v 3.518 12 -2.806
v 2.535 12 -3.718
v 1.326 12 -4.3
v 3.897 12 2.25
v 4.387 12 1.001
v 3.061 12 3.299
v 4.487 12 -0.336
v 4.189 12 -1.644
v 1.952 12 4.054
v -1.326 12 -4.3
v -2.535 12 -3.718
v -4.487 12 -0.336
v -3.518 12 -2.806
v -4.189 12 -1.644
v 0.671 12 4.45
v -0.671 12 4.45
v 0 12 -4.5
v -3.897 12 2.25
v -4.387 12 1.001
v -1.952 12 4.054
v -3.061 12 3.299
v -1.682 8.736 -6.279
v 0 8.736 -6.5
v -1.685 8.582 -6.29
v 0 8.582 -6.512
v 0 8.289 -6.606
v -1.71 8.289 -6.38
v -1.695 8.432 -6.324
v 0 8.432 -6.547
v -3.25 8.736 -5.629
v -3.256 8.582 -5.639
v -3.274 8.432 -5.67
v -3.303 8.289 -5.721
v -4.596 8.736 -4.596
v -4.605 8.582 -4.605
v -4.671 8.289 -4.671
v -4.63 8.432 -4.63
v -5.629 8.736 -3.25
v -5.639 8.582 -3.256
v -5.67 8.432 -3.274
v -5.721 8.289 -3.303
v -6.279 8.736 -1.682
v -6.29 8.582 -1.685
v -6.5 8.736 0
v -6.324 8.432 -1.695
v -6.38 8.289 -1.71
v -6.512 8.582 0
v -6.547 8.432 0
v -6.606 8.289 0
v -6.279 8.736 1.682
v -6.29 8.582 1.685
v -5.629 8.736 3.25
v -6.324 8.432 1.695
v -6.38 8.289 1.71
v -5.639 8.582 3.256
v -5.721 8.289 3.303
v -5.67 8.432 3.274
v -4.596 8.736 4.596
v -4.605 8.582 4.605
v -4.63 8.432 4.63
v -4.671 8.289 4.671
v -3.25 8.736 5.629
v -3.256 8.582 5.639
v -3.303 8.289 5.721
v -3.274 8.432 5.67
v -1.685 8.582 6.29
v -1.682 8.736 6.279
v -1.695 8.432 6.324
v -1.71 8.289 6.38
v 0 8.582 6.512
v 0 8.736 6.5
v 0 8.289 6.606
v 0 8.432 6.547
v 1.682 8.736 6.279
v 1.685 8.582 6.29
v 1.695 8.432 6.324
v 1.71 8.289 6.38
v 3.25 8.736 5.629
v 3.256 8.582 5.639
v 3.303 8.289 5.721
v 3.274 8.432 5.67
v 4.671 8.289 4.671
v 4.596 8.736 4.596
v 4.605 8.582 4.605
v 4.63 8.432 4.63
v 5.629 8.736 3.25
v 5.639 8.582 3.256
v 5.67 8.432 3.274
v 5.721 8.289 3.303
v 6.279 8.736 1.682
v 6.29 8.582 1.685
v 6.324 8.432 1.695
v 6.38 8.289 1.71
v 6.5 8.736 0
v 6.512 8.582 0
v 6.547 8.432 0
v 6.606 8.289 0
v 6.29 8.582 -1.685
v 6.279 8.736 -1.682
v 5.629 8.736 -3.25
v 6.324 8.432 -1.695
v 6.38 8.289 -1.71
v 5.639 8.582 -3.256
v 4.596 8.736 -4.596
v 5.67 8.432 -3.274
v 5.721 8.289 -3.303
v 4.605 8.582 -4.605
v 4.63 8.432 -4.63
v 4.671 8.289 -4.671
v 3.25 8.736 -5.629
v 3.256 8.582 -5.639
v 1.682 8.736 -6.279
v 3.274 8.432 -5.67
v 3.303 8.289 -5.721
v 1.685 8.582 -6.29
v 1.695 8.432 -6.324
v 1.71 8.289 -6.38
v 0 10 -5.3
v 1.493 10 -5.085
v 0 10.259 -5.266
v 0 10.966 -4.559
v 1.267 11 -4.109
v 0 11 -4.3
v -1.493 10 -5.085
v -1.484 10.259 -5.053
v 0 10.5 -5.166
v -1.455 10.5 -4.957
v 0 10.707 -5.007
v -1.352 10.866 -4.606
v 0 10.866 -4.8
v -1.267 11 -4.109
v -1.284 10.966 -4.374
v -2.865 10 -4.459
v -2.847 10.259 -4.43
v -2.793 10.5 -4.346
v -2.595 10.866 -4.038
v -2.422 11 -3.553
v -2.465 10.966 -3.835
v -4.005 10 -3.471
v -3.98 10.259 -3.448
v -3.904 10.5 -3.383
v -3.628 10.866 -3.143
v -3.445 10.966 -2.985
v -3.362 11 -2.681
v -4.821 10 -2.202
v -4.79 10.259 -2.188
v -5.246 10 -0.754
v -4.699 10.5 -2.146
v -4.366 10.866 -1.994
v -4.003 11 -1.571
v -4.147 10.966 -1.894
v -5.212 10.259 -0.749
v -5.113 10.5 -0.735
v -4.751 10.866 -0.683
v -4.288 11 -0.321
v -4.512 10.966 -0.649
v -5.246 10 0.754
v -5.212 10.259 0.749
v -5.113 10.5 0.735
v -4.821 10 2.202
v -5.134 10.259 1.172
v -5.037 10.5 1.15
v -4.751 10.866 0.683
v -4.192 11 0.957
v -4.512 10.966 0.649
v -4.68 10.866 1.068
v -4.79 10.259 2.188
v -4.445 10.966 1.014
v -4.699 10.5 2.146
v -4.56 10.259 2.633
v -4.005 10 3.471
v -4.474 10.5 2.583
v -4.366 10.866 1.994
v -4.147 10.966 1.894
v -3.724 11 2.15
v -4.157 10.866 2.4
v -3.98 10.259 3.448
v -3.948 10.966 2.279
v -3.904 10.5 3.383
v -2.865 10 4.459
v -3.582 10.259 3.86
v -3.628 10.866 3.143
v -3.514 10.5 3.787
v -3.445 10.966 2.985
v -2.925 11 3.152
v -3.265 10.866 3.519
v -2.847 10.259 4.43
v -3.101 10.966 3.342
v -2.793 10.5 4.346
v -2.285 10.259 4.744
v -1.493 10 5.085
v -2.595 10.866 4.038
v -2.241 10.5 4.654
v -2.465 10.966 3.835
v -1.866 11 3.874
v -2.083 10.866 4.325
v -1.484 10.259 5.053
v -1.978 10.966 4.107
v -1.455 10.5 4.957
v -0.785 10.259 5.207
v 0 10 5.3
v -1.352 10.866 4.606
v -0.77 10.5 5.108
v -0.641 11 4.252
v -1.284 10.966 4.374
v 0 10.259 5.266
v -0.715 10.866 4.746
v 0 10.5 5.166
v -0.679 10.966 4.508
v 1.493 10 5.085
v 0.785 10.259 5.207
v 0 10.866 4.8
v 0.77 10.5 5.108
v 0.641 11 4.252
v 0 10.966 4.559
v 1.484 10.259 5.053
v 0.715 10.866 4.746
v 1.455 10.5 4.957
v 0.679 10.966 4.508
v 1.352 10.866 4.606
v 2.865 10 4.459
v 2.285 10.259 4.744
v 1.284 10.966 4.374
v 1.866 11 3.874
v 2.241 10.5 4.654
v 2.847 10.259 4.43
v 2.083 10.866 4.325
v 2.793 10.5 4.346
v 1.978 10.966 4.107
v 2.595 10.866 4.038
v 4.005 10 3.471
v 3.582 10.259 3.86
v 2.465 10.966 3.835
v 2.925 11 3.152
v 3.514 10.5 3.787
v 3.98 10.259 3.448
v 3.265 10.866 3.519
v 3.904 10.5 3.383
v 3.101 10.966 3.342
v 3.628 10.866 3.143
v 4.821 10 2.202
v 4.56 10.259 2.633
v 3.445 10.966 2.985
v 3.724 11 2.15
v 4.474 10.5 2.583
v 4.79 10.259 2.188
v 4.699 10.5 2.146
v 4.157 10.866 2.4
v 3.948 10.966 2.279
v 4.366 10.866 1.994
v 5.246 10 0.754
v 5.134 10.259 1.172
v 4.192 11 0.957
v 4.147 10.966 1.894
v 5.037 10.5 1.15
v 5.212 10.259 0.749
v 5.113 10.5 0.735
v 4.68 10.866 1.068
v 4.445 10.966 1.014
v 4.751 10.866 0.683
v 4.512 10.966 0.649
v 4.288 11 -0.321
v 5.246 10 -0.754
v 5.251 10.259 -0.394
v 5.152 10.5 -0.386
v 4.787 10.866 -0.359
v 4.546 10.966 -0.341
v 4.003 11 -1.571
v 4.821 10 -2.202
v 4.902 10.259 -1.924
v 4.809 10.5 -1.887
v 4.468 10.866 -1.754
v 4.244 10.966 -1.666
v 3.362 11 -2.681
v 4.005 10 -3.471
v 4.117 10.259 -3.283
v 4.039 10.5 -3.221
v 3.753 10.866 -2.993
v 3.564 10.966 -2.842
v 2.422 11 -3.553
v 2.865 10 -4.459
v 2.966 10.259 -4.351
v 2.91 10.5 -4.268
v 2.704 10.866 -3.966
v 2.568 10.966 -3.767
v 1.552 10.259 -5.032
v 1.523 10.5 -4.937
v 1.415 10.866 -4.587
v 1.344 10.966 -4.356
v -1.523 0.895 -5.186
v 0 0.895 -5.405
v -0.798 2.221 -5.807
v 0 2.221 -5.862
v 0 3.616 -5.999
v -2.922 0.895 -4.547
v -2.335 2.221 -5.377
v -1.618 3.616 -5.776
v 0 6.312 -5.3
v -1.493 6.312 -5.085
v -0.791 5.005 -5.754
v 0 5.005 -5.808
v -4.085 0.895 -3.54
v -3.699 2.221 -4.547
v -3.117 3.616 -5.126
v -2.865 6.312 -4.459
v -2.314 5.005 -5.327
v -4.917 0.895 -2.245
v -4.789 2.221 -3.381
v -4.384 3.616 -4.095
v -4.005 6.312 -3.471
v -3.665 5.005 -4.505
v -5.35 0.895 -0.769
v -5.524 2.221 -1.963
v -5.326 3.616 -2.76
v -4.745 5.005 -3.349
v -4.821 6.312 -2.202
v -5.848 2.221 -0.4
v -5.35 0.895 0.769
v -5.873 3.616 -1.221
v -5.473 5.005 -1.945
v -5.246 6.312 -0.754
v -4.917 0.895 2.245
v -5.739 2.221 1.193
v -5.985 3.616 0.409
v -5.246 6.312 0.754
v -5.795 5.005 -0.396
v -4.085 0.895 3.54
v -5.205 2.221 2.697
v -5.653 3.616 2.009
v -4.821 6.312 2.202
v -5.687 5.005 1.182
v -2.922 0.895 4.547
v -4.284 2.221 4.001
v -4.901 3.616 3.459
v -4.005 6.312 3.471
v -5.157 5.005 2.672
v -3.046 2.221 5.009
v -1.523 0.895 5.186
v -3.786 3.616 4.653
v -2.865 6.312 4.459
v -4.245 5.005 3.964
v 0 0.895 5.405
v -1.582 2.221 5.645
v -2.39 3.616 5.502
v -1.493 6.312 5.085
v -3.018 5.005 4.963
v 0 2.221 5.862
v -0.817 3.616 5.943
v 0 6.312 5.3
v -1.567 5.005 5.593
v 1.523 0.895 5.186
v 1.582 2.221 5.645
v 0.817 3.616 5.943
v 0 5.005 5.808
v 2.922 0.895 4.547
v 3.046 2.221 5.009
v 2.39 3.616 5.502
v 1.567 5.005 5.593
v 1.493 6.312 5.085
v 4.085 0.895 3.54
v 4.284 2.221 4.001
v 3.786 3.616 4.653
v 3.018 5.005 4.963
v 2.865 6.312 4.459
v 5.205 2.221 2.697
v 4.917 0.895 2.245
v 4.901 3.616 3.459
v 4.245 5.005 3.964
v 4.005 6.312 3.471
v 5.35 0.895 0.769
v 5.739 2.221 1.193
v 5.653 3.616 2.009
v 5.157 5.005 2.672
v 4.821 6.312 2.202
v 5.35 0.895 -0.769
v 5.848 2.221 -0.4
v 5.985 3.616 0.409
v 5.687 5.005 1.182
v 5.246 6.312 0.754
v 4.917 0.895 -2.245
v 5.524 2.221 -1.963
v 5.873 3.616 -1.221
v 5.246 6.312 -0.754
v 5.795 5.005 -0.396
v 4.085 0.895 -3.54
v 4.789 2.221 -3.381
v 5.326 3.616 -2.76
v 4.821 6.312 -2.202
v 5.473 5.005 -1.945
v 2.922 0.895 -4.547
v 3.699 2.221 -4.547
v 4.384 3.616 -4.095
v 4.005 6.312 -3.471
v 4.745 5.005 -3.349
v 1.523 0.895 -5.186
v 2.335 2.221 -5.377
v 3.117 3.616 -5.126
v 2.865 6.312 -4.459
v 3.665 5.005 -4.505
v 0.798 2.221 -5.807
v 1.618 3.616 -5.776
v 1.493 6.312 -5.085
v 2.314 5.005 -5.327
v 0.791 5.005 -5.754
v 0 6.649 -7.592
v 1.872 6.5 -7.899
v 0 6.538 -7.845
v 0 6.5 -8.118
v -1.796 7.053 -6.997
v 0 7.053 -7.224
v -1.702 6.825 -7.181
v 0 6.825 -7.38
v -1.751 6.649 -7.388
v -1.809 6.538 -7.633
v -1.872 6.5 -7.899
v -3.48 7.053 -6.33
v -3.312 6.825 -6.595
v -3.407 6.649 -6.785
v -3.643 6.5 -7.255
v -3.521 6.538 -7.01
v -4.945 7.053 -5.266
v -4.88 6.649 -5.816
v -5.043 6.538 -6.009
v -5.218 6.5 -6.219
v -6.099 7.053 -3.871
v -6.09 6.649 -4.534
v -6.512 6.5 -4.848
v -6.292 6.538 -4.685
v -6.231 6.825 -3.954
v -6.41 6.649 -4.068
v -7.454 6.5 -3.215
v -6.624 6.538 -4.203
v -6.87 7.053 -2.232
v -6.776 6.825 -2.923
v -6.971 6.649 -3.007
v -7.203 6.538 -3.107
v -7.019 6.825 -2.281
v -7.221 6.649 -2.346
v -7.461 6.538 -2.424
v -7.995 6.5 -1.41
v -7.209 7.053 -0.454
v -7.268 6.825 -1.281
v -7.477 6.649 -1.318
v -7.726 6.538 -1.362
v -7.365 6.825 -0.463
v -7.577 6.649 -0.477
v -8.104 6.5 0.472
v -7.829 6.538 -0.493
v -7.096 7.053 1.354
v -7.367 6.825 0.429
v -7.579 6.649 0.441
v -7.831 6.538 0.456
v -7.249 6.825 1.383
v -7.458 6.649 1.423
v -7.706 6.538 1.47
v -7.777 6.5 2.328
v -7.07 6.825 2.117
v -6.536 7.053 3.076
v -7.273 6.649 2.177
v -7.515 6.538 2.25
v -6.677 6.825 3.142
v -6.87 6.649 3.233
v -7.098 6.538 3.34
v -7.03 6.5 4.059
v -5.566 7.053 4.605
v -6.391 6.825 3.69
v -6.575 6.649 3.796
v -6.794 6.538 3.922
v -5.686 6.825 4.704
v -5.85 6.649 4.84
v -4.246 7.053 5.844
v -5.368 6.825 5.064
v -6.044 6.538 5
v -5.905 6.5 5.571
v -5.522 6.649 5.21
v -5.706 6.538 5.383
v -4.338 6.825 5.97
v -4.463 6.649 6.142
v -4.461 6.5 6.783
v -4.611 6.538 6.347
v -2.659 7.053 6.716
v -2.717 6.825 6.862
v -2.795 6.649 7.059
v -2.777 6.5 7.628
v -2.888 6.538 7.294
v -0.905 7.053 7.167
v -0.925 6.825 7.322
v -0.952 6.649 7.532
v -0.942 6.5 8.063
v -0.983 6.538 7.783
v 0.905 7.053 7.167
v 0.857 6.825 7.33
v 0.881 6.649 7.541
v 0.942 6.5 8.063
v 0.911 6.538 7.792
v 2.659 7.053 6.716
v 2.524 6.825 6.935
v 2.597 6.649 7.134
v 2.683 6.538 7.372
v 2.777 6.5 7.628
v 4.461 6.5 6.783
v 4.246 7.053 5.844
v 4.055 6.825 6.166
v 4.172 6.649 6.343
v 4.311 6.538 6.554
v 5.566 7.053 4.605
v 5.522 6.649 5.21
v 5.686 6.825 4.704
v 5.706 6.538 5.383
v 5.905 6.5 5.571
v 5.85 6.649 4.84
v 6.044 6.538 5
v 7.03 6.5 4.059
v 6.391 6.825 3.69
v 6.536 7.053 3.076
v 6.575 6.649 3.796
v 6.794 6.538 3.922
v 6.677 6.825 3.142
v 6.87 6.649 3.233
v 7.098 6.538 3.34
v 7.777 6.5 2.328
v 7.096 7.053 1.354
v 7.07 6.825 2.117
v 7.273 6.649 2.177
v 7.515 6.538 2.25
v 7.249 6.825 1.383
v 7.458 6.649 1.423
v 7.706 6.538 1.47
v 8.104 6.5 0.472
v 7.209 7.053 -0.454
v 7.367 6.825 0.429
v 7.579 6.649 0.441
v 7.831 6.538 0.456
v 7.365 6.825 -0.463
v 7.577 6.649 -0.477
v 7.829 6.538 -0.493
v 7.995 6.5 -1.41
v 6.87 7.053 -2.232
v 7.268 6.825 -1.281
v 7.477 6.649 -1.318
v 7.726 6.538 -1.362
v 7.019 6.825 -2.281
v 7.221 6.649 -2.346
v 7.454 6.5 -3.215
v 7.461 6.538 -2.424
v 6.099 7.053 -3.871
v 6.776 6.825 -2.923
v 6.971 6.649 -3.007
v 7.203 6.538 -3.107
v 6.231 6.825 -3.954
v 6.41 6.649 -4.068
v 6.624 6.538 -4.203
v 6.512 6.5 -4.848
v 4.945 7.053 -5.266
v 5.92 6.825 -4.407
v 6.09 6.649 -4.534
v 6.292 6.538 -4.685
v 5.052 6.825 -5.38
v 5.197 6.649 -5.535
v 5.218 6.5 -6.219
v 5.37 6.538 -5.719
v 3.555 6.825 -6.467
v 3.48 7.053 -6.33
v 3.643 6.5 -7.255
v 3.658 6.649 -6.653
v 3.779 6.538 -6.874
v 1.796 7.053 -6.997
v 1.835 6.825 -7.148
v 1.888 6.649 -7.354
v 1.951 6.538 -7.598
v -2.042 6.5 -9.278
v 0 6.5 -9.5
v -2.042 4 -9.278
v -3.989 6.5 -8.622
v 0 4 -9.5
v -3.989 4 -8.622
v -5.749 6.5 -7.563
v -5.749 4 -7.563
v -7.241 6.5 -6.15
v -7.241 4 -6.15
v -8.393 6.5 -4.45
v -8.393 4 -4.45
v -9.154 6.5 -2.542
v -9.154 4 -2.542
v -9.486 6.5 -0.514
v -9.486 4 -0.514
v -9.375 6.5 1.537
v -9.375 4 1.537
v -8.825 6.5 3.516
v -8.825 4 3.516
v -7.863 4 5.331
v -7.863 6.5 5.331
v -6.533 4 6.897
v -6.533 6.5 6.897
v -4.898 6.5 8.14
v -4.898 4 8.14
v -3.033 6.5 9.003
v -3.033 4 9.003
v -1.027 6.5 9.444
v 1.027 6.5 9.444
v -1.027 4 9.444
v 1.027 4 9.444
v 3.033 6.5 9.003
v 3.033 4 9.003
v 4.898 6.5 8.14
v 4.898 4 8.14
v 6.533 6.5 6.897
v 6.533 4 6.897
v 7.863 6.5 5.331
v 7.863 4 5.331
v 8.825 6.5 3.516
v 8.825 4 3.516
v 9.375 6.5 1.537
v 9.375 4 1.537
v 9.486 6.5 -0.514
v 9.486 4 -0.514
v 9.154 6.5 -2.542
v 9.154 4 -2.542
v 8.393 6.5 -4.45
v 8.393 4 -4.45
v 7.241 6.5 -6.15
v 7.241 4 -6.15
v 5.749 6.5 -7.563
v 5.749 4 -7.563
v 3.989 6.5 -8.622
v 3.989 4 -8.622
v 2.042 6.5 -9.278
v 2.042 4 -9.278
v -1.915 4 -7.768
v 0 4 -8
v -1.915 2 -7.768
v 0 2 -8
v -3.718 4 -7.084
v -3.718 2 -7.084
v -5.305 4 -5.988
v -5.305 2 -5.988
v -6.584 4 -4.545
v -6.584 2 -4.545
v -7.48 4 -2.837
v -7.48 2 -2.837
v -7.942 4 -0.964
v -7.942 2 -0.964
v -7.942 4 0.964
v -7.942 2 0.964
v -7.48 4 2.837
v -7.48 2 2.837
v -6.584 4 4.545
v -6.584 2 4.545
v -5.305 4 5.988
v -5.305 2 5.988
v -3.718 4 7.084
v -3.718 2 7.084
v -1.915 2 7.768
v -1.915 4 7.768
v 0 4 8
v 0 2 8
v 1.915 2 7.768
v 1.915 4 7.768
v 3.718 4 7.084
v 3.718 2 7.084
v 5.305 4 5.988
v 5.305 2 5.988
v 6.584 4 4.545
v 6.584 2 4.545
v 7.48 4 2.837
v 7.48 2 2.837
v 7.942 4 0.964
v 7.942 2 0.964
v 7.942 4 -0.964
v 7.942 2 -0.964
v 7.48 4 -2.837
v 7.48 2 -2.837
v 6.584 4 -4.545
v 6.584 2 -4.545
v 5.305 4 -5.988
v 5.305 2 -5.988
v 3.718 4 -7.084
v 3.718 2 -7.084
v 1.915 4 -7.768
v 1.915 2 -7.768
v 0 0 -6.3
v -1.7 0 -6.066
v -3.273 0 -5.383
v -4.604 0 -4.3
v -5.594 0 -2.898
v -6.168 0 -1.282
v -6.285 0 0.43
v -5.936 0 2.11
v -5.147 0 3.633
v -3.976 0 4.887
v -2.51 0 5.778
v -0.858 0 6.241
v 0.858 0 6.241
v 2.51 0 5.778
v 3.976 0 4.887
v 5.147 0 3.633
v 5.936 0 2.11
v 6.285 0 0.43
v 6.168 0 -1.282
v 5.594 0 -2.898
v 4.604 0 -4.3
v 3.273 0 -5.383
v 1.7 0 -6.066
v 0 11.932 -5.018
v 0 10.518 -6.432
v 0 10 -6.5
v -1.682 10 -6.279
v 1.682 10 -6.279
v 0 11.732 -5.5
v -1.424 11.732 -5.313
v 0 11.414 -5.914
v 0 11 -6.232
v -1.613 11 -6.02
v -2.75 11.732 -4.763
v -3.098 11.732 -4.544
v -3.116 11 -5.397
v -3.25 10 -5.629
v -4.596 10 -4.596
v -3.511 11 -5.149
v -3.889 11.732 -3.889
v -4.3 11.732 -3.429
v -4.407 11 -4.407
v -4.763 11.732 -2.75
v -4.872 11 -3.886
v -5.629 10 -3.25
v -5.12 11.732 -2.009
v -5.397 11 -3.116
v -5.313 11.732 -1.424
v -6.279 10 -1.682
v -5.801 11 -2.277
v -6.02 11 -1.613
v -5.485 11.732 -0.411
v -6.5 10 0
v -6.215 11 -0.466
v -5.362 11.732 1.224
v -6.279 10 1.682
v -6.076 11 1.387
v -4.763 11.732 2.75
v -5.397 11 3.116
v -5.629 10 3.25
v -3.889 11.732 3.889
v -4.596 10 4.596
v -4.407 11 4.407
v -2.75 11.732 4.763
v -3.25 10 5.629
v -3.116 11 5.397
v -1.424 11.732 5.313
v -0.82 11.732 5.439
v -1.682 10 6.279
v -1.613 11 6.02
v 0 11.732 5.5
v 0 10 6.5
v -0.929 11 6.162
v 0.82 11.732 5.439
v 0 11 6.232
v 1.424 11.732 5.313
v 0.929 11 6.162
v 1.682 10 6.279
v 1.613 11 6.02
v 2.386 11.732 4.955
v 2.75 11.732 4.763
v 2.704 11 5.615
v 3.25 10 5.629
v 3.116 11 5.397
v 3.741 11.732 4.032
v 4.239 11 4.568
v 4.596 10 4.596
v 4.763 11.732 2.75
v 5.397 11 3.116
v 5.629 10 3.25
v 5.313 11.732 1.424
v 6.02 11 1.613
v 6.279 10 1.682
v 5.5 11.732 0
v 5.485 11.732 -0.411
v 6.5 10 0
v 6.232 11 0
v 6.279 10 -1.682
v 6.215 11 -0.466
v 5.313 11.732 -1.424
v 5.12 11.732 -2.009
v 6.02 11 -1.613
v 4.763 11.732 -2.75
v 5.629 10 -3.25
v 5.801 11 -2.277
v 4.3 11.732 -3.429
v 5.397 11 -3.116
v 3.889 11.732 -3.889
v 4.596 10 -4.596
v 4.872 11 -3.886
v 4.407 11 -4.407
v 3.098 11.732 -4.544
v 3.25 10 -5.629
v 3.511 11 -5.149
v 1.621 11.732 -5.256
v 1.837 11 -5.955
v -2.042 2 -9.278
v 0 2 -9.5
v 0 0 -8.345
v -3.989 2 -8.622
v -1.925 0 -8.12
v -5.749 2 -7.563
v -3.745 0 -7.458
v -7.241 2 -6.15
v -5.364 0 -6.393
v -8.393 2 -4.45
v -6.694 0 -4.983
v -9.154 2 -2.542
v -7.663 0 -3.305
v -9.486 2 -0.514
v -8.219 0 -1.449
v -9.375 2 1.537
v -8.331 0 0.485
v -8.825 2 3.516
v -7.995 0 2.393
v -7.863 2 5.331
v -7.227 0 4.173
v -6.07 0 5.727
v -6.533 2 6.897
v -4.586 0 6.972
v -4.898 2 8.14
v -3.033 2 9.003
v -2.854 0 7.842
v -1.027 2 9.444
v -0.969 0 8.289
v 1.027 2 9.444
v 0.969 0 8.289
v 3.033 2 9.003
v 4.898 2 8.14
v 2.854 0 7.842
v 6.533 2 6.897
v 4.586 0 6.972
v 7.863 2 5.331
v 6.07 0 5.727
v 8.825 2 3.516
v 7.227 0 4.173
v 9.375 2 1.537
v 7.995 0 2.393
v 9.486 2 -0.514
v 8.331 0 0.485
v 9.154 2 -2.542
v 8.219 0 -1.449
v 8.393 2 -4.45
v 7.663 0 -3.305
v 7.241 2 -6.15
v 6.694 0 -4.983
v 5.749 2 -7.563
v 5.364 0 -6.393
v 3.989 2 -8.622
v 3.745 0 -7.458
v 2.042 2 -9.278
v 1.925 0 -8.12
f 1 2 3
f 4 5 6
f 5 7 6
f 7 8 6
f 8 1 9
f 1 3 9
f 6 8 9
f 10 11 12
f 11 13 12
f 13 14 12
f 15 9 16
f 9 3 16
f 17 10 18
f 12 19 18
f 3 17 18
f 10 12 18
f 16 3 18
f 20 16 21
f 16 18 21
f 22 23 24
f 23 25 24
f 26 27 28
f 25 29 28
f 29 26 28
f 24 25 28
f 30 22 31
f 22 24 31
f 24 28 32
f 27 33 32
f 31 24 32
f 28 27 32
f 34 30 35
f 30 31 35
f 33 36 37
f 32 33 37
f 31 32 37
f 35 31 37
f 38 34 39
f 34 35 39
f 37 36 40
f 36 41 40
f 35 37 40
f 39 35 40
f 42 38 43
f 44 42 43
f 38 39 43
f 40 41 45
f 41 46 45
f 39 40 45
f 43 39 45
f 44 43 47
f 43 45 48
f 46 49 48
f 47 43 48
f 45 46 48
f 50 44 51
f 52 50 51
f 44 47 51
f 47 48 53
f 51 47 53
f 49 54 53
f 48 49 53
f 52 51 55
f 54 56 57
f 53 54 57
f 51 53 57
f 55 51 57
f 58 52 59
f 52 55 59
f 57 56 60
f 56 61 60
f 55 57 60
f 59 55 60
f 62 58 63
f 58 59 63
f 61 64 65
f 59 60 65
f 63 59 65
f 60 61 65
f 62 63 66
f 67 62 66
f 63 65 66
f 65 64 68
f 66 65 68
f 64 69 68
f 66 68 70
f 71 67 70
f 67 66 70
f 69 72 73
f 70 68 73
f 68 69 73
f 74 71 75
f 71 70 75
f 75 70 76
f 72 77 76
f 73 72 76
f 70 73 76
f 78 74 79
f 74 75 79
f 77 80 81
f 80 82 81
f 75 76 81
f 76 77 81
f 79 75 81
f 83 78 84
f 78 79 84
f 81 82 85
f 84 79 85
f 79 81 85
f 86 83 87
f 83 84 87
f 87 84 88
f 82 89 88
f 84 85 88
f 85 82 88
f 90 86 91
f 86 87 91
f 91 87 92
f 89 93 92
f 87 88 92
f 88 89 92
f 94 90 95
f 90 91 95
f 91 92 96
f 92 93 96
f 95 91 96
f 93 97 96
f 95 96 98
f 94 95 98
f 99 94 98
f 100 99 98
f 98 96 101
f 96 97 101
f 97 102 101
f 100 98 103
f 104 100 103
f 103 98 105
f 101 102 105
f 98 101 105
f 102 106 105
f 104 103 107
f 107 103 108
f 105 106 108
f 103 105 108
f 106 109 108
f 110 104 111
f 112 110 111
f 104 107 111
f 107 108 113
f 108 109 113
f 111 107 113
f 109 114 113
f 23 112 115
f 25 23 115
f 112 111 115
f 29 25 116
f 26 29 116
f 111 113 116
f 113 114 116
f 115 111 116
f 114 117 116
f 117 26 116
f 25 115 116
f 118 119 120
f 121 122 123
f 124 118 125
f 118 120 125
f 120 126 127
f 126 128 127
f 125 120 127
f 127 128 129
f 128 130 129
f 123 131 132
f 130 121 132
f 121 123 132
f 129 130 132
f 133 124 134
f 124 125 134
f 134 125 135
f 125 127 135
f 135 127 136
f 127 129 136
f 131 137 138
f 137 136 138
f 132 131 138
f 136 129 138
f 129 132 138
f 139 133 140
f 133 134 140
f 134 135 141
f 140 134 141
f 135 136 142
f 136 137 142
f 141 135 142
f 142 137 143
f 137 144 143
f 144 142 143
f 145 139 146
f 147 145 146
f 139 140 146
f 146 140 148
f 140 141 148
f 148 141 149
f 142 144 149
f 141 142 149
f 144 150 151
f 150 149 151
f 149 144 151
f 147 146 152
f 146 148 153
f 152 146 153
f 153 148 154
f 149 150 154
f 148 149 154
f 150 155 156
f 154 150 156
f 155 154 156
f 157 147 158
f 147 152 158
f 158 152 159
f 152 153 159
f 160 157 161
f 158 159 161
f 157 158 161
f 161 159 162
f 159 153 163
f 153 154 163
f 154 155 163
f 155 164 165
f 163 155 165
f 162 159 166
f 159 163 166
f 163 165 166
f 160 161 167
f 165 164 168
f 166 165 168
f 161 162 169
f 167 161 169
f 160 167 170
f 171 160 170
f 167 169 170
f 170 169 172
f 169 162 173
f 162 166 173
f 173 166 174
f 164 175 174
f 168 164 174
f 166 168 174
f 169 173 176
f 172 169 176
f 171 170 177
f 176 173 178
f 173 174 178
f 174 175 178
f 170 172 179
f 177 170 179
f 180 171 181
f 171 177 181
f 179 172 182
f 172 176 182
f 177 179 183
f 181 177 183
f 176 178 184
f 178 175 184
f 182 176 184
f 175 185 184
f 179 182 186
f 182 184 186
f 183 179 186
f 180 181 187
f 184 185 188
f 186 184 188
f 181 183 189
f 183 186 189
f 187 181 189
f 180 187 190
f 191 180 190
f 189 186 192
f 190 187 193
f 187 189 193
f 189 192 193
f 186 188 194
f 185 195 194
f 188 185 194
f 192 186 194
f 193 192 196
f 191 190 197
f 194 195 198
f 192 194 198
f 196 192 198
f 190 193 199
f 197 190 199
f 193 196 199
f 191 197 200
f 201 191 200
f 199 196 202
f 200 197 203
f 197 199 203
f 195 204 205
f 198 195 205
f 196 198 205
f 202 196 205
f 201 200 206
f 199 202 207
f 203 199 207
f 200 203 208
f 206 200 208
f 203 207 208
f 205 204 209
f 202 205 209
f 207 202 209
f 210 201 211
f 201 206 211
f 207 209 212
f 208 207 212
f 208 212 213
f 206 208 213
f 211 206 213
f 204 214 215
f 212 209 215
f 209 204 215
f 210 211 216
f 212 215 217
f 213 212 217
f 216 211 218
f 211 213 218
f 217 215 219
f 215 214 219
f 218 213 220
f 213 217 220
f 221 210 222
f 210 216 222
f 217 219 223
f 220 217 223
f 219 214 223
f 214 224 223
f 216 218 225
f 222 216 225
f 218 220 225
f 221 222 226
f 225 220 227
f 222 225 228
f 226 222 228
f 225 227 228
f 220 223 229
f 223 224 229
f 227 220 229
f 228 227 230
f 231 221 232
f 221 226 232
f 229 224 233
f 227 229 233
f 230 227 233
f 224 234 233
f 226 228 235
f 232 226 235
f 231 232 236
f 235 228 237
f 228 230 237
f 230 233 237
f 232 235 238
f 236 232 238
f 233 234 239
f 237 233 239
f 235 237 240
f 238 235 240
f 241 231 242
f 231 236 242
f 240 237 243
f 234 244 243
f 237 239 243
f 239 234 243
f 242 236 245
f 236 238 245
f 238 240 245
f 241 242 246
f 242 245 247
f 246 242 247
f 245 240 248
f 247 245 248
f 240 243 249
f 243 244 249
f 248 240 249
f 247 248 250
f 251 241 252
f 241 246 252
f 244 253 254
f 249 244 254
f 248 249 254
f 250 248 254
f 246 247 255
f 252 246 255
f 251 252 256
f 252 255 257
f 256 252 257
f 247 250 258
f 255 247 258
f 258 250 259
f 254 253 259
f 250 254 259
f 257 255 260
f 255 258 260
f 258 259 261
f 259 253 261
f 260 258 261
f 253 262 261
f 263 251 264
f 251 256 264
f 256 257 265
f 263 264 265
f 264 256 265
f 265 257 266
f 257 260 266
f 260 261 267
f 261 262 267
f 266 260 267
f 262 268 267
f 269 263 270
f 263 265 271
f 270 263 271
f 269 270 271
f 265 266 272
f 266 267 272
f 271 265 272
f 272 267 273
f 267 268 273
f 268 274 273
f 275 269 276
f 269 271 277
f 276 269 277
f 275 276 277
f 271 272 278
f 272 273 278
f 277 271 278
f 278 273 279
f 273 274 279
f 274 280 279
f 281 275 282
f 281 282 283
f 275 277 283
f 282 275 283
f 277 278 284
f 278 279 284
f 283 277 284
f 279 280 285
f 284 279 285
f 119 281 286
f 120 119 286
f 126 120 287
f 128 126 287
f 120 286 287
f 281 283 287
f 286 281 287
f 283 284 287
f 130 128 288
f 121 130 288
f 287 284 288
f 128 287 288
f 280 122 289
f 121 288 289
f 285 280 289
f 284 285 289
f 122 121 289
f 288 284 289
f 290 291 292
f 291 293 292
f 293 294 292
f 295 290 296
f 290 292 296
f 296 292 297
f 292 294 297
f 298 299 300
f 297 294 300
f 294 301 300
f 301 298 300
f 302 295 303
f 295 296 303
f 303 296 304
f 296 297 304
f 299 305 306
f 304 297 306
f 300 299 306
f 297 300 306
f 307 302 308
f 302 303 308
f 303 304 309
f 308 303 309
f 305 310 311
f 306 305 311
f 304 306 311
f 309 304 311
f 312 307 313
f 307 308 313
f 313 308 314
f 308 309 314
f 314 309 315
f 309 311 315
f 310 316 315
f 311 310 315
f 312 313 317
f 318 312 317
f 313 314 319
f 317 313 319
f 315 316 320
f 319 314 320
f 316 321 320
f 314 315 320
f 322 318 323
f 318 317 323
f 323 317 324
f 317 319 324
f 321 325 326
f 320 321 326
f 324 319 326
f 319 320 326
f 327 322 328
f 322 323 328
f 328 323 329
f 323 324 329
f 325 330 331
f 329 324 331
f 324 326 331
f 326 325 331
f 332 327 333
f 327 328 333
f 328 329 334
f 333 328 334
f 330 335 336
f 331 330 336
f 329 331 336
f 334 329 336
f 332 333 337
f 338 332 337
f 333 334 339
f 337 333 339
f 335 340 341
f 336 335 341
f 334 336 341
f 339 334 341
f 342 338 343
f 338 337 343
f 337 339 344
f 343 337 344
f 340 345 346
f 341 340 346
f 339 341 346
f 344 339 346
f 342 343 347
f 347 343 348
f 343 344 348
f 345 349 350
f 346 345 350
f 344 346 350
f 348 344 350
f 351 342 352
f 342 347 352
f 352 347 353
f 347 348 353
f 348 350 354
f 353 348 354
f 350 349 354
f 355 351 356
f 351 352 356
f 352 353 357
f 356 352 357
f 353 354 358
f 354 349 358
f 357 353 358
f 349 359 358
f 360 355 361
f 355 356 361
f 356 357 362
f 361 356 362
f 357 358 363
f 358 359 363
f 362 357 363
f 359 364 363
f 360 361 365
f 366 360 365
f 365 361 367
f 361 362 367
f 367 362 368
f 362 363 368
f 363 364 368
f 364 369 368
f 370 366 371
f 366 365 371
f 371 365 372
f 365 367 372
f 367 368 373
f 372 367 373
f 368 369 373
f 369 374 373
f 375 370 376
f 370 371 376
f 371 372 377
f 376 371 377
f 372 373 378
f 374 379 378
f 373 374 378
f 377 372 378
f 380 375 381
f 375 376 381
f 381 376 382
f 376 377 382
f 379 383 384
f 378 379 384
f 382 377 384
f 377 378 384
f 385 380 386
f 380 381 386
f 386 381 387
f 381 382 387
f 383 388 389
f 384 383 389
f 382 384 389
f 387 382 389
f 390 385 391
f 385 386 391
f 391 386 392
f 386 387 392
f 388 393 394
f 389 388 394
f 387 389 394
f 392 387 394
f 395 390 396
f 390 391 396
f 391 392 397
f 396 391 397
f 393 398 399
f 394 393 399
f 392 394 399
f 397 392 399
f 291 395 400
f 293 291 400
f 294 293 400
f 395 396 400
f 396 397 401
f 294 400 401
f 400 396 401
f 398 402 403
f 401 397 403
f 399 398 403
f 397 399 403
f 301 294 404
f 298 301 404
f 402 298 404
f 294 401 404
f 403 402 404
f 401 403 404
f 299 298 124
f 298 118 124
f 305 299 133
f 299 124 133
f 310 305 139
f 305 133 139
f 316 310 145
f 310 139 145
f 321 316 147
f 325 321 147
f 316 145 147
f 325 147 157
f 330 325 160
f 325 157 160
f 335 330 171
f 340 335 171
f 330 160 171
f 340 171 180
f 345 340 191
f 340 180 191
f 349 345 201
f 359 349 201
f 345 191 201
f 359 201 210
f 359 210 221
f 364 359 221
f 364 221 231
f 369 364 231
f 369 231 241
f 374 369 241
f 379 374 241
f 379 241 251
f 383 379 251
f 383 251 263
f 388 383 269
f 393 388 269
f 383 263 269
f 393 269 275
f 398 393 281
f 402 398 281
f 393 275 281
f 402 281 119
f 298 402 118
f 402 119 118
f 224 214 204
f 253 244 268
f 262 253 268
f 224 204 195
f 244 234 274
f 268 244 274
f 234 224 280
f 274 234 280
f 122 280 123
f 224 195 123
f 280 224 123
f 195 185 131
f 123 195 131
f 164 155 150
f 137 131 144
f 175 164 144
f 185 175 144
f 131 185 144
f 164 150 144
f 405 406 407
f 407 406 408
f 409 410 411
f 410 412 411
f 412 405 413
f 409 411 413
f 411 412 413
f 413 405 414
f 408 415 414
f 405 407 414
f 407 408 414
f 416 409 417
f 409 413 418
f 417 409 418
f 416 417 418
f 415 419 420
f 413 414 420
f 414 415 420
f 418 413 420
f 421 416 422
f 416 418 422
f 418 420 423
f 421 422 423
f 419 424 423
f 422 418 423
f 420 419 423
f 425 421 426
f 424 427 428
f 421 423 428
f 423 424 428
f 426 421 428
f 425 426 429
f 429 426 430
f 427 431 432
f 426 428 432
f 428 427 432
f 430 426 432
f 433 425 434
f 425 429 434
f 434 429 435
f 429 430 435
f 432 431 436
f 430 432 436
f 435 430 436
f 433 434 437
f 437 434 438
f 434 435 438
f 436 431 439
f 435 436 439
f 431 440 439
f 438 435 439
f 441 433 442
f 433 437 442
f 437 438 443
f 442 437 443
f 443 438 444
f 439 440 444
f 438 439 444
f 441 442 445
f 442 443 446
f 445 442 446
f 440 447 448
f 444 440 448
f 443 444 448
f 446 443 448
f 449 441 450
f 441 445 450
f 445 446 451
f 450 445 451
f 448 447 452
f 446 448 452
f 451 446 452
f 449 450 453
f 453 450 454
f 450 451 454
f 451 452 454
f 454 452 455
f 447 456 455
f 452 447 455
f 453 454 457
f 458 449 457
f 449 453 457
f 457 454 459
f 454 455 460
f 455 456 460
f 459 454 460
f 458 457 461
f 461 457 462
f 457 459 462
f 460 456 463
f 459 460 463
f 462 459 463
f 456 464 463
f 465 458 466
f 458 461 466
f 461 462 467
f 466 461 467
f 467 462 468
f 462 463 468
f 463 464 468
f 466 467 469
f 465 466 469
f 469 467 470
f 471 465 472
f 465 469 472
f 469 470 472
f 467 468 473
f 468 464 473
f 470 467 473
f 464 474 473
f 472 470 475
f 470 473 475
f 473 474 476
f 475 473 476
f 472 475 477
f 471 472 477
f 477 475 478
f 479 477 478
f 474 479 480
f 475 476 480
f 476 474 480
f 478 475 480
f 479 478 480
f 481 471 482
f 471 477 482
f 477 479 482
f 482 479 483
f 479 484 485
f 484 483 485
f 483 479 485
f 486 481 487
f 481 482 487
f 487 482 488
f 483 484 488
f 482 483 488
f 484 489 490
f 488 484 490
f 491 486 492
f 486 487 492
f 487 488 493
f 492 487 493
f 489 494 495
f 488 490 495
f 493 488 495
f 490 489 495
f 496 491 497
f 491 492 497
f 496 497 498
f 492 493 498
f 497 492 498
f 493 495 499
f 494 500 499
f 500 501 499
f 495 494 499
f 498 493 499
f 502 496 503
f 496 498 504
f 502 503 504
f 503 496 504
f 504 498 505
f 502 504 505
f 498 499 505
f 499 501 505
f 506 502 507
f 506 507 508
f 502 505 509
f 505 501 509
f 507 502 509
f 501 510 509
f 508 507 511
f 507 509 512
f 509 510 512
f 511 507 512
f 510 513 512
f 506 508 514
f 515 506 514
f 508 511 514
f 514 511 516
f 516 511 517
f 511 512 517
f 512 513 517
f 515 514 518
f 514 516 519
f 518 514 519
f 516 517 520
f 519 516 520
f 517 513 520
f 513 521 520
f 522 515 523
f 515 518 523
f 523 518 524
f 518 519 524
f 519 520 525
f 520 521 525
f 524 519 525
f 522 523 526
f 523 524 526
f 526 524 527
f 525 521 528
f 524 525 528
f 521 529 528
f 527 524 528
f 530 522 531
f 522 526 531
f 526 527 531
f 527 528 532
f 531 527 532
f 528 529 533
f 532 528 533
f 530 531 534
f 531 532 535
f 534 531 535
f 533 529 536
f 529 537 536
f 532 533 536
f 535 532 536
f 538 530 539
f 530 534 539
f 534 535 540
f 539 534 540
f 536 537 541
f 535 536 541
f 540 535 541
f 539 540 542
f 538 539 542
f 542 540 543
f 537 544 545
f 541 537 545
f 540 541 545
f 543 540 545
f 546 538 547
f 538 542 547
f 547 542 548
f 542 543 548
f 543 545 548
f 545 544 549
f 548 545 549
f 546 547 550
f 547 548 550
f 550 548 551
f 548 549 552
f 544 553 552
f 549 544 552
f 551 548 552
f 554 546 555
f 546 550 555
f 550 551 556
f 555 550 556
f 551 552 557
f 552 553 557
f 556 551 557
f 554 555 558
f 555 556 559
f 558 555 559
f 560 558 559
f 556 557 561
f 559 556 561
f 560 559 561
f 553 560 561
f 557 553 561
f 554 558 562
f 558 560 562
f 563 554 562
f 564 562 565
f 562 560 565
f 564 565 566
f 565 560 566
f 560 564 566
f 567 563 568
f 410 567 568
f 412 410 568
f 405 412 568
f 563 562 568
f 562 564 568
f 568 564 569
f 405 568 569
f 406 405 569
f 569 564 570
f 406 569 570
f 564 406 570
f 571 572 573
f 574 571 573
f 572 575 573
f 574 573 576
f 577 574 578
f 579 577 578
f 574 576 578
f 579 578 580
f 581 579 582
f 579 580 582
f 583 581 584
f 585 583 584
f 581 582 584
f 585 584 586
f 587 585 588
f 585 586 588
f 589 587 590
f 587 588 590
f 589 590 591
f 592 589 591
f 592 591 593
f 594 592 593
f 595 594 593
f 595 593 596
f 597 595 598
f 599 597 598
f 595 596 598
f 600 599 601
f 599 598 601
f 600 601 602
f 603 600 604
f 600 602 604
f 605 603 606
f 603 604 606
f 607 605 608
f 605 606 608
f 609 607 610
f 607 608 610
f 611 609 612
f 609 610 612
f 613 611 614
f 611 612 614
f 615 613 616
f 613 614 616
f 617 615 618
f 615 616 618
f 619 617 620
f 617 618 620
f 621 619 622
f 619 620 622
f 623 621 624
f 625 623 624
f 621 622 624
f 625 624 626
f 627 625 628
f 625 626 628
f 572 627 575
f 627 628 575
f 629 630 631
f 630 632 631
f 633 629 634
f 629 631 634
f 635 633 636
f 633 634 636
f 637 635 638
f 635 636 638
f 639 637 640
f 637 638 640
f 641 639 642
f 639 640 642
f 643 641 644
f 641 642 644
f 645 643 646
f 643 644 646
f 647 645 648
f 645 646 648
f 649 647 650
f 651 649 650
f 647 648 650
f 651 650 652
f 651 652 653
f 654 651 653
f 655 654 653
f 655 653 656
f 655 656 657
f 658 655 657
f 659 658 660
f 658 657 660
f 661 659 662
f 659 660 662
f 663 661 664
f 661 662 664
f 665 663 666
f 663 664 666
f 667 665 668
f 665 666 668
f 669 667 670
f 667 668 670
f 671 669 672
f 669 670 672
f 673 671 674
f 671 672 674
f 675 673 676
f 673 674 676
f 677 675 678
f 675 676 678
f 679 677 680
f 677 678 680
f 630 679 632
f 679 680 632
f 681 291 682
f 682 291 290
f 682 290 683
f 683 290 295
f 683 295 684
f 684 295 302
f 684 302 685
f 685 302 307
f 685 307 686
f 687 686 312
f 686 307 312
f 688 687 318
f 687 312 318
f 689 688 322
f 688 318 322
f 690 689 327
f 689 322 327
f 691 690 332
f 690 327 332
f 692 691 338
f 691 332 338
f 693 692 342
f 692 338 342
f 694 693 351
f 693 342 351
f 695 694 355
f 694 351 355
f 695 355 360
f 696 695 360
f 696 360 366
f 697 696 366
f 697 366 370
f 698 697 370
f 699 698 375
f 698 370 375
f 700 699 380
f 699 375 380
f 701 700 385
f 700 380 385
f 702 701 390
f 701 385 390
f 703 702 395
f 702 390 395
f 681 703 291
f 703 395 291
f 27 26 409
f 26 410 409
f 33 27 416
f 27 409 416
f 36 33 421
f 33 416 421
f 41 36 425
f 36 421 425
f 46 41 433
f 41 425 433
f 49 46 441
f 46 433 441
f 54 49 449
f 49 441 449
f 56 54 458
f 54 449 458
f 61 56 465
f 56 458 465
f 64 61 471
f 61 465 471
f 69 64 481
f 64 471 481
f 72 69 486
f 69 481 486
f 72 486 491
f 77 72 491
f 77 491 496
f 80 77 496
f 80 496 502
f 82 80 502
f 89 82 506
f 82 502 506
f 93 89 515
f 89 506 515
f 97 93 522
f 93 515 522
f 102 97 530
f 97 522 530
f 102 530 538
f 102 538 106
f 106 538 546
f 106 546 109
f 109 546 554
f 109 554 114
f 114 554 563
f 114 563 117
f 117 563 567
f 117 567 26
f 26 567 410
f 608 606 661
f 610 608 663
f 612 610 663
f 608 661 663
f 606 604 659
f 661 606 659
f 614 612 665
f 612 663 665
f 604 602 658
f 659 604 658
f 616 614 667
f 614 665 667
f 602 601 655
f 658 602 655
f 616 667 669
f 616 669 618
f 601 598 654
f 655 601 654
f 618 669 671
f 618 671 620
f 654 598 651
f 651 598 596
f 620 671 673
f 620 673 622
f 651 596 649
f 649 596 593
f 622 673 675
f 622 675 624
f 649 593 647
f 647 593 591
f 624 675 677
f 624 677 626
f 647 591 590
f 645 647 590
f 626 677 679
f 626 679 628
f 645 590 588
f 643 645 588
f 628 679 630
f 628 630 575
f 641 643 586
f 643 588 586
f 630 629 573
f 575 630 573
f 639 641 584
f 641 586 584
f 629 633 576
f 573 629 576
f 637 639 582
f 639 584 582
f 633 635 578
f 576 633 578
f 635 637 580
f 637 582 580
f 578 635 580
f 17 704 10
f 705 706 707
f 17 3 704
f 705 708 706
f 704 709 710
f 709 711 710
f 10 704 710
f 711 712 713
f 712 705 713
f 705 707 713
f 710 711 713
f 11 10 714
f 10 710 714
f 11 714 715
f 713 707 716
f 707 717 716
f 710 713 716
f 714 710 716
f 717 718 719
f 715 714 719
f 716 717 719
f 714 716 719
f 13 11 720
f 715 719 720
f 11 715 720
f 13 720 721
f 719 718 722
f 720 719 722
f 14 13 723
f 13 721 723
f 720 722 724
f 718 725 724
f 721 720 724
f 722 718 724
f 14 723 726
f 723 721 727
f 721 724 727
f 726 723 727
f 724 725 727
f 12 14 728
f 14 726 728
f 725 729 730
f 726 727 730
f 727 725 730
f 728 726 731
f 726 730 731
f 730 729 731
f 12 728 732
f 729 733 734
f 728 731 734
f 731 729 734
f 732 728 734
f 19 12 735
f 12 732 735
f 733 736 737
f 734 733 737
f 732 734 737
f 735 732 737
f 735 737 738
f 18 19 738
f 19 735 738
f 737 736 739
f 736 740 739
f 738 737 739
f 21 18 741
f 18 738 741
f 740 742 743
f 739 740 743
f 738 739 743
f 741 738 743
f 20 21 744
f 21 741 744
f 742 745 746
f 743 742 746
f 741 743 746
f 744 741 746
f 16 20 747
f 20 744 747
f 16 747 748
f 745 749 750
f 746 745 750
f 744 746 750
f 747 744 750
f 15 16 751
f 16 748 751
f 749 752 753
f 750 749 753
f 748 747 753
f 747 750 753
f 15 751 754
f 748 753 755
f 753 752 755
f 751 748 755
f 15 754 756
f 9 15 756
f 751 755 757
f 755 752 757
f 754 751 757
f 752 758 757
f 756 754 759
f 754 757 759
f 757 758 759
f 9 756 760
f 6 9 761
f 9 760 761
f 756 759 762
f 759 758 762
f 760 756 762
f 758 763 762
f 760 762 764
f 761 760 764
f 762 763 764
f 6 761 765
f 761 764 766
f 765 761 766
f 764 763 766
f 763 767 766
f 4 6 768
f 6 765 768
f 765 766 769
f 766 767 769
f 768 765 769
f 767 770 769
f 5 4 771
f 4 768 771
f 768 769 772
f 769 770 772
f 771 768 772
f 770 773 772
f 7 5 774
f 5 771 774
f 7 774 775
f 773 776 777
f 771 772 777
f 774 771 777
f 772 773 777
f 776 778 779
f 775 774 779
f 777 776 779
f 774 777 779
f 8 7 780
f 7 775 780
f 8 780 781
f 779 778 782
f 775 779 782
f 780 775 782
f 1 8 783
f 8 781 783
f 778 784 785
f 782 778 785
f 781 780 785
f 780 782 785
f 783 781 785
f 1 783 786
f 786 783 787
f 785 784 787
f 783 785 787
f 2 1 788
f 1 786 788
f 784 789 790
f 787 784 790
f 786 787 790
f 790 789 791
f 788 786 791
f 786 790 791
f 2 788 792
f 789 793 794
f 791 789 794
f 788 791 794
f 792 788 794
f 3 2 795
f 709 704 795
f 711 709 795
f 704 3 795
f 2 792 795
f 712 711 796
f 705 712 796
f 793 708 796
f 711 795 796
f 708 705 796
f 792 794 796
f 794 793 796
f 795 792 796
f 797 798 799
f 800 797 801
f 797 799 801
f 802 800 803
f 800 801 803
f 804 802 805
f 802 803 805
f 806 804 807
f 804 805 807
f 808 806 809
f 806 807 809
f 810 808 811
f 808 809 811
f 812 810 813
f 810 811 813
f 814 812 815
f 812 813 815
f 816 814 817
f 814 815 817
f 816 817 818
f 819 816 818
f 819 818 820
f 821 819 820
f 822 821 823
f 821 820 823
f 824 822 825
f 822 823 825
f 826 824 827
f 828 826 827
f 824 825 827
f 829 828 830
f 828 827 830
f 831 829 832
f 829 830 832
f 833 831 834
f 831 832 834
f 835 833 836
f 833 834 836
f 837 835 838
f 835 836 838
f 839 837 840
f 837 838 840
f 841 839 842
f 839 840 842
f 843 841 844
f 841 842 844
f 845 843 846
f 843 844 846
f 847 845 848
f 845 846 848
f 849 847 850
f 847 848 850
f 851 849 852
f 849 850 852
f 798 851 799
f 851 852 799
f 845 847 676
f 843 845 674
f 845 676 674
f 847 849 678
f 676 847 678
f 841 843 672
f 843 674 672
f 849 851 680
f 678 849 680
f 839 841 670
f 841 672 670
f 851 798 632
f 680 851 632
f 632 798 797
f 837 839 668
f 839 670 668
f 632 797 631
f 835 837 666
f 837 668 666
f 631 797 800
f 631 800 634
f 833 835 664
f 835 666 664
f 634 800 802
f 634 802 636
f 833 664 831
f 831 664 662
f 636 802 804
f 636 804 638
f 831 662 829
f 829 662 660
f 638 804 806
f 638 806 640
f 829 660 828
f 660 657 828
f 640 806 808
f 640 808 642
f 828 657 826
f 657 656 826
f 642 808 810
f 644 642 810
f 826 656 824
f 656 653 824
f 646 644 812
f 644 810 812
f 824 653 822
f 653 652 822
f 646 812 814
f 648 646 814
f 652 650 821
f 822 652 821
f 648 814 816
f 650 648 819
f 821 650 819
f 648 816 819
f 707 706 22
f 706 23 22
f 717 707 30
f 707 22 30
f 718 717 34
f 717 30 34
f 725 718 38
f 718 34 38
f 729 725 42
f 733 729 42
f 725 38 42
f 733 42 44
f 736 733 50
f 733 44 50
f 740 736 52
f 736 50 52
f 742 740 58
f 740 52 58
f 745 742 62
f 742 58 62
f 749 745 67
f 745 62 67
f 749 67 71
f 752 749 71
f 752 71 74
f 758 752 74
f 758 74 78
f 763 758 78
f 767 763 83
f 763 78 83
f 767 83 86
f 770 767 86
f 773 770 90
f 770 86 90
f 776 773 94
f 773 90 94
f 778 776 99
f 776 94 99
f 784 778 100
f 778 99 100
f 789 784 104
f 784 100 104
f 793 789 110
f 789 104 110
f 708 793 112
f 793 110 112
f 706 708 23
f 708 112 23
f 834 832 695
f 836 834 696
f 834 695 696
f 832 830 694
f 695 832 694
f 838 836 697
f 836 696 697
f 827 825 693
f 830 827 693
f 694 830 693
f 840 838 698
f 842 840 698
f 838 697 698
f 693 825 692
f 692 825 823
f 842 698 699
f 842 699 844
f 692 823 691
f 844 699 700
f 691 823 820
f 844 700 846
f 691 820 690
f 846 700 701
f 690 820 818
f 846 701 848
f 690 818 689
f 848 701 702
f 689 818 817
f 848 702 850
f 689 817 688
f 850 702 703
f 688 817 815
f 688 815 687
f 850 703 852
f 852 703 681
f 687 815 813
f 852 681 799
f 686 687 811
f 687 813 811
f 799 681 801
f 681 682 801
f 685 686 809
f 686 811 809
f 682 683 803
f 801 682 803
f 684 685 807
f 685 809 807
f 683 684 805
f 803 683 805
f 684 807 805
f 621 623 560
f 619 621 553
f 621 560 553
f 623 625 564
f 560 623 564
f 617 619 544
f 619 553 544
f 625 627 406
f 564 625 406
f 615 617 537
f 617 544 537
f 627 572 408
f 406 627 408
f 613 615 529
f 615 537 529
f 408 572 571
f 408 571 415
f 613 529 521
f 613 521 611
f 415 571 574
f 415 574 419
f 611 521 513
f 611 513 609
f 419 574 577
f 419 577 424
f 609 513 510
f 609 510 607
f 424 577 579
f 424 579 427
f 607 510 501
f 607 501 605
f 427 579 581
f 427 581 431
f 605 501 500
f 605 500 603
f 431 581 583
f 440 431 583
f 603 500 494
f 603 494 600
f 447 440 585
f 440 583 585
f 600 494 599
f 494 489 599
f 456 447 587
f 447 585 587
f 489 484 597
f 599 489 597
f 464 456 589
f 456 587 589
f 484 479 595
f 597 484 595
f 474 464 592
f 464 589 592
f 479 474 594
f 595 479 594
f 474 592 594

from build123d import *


with BuildPart() as part:
    # Esquisse1 → Révolution1 (revolve)
    with BuildSketch(Plane.XY, mode=Mode.PRIVATE) as r_volution1_sk:
        with BuildLine():
            Line((8.345299462, 0), (6.3, 0))
            Line((6.3, 0), (5.404996879, 0.895003121))
            ThreePointArc((5.404996879, 0.895003121), (5.998873428, 3.616265174), (5.3, 6.312472222))
            Line((5.3, 6.312472222), (5.3, 10))
            ThreePointArc((5.3, 10), (5.007106781, 10.707106781), (4.3, 11))
            Line((4.3, 11), (0, 11))
            Line((0, 11), (0, 12))
            Line((0, 12), (4.5, 12))
            ThreePointArc((4.5, 12), (5.914213562, 11.414213562), (6.5, 10))
            Line((6.5, 10), (6.5, 8.736067977))
            ThreePointArc((6.5, 8.736067977), (6.526751011, 8.506315057), (6.605572809, 8.288854382))
            Line((6.605572809, 8.288854382), (7.223606798, 7.052786405))
            ThreePointArc((7.223606798, 7.052786405), (7.592302877, 6.649349192), (8.118033989, 6.5))
            Line((8.118033989, 6.5), (9.5, 6.5))
            Line((9.5, 6.5), (9.5, 4))
            Line((9.5, 4), (8, 4))
            Line((8, 4), (8, 2))
            Line((8, 2), (9.5, 2))
            Line((9.5, 2), (8.345299462, 0))
        make_face()
    revolve(r_volution1_sk.sketch.rotate(Axis((0, 0, 0), (0, 1, 0)), 90), axis=Axis((0, 0, 0), (0, 1, 0)))


solid = part.part
